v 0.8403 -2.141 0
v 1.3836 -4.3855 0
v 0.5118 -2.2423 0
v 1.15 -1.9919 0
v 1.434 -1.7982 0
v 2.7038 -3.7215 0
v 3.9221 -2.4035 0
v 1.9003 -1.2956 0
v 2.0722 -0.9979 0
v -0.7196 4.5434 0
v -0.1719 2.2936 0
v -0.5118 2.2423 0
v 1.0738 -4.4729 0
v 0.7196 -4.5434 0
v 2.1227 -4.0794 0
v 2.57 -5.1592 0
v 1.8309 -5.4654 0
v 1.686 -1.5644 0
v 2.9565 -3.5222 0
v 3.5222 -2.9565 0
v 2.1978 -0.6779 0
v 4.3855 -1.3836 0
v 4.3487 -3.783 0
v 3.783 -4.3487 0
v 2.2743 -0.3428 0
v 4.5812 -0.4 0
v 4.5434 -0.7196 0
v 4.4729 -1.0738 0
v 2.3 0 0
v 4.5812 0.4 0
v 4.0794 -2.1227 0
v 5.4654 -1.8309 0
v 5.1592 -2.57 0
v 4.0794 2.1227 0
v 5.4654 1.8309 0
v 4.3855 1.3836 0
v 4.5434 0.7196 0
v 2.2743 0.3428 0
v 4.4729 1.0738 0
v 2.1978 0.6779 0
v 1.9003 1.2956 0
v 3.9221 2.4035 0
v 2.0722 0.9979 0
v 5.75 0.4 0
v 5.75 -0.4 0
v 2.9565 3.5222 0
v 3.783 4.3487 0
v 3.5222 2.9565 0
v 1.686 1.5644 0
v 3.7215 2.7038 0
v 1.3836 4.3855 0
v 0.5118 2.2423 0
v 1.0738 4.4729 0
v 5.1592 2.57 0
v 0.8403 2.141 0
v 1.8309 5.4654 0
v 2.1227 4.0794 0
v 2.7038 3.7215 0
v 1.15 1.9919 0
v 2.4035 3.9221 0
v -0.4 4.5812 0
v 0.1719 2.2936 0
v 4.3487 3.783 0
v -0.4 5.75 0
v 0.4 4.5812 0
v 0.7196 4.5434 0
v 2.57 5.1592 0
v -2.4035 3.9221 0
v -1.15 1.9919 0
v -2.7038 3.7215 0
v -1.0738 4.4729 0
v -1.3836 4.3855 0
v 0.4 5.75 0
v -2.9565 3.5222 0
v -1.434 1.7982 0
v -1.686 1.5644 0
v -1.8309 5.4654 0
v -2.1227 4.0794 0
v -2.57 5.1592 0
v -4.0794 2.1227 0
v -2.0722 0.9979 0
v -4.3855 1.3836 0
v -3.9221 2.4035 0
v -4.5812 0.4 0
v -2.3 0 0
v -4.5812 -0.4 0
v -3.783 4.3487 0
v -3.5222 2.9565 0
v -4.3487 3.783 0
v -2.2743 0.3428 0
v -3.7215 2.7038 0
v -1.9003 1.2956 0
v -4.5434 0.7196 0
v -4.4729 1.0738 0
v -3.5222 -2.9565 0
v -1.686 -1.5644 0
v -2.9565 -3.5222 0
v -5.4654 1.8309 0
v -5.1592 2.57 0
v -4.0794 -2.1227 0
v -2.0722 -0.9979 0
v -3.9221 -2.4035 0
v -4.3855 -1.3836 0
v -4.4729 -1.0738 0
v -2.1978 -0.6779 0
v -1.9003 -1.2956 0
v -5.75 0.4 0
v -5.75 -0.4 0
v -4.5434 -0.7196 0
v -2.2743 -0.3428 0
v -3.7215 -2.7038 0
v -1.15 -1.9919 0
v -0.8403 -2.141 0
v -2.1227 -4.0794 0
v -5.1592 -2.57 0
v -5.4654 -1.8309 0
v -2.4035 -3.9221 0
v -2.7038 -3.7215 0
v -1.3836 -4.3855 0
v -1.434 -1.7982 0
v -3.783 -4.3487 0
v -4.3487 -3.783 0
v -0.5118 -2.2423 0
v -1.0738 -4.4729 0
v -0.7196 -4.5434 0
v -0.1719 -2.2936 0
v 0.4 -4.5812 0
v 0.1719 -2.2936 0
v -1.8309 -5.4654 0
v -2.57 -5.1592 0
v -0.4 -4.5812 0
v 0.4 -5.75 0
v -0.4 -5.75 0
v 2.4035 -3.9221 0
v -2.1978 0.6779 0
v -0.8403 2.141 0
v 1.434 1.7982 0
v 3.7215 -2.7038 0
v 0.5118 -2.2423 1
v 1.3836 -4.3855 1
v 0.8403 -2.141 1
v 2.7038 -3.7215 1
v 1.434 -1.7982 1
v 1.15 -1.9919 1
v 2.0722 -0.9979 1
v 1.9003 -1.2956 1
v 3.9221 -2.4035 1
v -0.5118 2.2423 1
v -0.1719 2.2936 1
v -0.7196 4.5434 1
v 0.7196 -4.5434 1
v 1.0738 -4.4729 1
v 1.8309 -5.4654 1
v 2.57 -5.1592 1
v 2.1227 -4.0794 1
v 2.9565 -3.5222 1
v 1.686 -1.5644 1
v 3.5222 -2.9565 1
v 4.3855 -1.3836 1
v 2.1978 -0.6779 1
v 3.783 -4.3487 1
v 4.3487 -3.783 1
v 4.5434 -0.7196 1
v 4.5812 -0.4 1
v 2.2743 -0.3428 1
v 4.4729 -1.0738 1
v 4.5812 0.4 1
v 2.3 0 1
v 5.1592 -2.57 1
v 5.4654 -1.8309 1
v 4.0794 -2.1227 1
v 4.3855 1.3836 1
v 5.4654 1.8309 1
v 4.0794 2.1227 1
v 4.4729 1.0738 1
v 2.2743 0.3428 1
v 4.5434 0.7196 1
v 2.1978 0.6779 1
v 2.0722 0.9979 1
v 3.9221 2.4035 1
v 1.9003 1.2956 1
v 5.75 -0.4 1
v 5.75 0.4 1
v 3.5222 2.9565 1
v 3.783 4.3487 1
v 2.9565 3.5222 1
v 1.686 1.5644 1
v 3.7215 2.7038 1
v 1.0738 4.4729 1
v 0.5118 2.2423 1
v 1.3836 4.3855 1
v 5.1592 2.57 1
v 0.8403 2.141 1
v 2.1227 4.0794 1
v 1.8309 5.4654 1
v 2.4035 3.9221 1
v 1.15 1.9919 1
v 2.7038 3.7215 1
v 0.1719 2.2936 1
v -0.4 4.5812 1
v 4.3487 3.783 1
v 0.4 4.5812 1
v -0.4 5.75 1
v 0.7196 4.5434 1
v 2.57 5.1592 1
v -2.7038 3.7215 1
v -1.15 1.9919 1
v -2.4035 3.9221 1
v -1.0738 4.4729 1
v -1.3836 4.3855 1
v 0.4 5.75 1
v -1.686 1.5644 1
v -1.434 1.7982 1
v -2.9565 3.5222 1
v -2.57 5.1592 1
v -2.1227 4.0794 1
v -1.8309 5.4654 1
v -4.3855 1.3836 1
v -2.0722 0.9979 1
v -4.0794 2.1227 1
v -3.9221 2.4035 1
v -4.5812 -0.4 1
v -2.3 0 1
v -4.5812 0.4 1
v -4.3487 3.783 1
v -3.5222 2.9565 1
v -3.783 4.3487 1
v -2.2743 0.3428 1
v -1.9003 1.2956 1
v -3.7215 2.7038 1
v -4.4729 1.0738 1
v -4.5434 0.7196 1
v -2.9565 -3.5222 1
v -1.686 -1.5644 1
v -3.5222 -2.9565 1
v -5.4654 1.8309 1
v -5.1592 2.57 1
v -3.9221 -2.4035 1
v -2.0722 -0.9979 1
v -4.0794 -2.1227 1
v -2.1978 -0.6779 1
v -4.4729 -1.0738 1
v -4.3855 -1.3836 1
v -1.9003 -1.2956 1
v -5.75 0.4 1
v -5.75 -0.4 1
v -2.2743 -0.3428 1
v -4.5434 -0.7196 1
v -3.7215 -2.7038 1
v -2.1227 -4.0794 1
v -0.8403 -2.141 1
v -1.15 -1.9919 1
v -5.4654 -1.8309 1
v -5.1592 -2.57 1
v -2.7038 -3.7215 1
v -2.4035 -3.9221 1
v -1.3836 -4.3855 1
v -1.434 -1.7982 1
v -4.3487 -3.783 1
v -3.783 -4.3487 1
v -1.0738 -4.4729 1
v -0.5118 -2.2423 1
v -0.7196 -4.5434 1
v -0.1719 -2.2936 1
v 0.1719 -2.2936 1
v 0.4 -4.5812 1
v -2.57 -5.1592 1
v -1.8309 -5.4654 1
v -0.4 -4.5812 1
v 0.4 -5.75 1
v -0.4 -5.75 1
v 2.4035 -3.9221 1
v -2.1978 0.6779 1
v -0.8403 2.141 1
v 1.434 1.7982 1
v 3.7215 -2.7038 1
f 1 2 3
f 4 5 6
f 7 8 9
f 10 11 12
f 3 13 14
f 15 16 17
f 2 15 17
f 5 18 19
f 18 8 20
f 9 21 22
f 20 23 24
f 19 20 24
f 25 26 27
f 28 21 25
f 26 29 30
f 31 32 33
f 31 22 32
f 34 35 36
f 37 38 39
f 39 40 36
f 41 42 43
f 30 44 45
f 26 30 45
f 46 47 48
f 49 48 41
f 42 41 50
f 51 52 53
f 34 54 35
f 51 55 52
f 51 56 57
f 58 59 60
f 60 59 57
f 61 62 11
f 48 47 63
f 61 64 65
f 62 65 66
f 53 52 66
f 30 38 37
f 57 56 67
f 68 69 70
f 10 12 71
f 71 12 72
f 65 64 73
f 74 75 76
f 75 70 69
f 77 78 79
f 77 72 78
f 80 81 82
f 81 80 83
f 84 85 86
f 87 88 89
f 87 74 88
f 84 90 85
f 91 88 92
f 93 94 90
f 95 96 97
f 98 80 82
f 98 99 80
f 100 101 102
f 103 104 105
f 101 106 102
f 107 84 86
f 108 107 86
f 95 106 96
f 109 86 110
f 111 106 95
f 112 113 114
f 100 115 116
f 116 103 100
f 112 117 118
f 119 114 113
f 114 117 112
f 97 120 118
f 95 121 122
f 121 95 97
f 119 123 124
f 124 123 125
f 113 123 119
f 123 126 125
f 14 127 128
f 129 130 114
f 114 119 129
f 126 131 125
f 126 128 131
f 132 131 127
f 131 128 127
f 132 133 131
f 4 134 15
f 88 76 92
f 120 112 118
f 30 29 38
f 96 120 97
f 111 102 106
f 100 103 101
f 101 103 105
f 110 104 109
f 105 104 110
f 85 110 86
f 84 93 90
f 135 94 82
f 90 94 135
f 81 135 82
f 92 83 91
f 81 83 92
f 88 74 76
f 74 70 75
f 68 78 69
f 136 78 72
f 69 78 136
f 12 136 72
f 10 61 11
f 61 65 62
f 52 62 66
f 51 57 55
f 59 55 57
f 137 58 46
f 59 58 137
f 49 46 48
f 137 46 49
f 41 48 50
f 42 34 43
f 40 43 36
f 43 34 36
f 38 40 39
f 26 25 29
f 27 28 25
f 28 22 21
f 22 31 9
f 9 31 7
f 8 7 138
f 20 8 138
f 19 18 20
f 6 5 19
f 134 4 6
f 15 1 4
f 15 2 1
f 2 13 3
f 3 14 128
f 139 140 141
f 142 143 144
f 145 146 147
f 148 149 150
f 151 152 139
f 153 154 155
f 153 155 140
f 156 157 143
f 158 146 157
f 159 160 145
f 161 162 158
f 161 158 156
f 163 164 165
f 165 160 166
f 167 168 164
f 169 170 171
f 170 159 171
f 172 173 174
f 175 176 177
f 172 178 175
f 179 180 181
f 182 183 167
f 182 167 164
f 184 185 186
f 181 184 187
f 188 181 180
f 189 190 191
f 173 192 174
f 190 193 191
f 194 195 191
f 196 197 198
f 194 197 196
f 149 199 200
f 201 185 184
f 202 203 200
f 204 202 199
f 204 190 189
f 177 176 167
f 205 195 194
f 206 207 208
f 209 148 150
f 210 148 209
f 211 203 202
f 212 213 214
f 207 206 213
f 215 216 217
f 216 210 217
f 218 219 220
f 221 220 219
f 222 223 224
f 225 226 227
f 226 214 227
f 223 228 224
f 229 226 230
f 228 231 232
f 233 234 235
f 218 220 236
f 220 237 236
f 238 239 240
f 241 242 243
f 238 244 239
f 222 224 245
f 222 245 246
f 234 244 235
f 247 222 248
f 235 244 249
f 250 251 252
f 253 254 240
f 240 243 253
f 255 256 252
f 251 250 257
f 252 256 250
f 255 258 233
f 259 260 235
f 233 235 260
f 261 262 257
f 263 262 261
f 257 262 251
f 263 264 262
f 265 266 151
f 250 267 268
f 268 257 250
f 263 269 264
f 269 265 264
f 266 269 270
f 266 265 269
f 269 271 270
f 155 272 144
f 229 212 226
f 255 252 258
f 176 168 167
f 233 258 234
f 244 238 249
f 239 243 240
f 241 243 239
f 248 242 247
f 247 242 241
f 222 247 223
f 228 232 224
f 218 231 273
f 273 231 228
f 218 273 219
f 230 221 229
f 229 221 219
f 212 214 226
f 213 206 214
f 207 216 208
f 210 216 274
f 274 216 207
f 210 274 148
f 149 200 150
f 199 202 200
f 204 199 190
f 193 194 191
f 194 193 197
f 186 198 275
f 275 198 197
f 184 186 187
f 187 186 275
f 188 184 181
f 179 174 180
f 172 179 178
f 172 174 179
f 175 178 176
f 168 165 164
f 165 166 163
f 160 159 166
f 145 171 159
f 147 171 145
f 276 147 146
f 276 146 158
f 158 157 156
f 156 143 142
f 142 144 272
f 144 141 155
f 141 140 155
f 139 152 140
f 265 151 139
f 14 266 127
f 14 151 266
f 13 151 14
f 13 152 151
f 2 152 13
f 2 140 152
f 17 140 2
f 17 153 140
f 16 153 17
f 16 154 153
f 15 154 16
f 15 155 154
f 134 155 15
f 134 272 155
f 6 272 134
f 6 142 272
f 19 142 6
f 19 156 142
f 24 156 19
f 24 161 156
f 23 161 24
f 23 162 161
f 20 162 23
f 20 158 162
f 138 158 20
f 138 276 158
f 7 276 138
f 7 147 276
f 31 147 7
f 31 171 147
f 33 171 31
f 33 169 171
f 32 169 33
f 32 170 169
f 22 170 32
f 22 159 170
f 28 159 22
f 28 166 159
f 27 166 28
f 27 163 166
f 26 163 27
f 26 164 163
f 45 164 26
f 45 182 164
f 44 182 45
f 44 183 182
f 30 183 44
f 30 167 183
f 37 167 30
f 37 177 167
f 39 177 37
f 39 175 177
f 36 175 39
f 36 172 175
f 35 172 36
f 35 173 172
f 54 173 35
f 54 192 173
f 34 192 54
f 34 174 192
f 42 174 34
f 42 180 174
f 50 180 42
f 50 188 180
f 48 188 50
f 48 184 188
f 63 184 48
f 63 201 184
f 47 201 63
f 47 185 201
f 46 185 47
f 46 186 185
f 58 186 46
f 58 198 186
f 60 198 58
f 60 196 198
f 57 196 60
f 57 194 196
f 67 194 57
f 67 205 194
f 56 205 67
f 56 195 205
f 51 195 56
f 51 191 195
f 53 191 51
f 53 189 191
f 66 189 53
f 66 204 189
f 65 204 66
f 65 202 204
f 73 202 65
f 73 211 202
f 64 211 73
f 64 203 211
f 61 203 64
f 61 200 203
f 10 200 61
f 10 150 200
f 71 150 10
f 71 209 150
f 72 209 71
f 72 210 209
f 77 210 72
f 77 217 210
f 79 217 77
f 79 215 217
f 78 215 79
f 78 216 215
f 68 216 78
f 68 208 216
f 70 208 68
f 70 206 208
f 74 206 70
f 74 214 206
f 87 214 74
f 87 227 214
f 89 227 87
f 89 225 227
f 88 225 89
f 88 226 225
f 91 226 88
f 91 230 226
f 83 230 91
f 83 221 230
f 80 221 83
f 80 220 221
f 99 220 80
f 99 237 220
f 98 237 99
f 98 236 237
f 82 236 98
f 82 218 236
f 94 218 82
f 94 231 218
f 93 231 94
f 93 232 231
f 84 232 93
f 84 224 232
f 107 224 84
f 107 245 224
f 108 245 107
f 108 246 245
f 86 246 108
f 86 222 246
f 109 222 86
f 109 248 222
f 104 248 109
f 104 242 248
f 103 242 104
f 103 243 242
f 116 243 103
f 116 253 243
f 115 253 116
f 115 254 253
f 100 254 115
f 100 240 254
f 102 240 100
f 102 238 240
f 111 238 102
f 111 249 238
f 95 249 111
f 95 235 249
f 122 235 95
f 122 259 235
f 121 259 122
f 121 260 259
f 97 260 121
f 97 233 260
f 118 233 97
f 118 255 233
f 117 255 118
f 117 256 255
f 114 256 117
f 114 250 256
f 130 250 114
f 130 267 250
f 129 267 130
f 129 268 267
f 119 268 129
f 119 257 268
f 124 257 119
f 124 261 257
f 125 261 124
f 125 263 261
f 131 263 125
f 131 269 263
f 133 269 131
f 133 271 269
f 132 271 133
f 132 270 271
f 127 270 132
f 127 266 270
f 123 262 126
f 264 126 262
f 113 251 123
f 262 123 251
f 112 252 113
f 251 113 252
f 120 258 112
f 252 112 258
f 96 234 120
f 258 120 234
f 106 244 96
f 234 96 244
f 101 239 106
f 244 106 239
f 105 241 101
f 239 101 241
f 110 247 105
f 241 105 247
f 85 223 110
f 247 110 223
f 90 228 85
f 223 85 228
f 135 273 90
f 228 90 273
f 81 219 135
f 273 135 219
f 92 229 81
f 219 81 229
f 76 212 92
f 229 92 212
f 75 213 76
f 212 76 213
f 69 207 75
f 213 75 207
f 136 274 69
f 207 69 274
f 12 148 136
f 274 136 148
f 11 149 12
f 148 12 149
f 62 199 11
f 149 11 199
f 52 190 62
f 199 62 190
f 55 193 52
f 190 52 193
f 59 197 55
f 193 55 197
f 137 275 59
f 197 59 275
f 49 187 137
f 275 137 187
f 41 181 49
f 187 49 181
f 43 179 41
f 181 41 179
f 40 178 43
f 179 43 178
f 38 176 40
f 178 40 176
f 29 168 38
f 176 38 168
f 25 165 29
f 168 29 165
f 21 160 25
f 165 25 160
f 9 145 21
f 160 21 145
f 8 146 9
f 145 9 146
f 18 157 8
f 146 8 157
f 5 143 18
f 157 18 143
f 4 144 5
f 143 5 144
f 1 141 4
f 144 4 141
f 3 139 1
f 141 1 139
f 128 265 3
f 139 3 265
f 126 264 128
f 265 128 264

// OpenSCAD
// part_id: b0
// name: B0 small gear
// source_drawing_ids: DRW-002
// units: mm
// revision: 0.1
// SPDX-License-Identifier: MIT

module b0_gear_2d(outer_d = 11.5, root_d = 9.2, tooth_count = 16, bore_d = 4.6) {
    difference() {
        union() {
            circle(d = root_d, $fn = 80);
            for (i = [0 : tooth_count - 1])
                rotate(i * 360 / tooth_count)
                    translate([outer_d / 2 - 0.6, 0])
                        square([1.2, 0.8], center = true);
        }
        circle(d = bore_d, $fn = 42);
    }
}

module part_b0(thickness = 1.0) {
    linear_extrude(height = thickness)
        b0_gear_2d();
}

// ---- "main guard" ----
// Default to previewing when opened directly:
if (is_undef(__LIB_MODE__)) {
    part_b0();
}
